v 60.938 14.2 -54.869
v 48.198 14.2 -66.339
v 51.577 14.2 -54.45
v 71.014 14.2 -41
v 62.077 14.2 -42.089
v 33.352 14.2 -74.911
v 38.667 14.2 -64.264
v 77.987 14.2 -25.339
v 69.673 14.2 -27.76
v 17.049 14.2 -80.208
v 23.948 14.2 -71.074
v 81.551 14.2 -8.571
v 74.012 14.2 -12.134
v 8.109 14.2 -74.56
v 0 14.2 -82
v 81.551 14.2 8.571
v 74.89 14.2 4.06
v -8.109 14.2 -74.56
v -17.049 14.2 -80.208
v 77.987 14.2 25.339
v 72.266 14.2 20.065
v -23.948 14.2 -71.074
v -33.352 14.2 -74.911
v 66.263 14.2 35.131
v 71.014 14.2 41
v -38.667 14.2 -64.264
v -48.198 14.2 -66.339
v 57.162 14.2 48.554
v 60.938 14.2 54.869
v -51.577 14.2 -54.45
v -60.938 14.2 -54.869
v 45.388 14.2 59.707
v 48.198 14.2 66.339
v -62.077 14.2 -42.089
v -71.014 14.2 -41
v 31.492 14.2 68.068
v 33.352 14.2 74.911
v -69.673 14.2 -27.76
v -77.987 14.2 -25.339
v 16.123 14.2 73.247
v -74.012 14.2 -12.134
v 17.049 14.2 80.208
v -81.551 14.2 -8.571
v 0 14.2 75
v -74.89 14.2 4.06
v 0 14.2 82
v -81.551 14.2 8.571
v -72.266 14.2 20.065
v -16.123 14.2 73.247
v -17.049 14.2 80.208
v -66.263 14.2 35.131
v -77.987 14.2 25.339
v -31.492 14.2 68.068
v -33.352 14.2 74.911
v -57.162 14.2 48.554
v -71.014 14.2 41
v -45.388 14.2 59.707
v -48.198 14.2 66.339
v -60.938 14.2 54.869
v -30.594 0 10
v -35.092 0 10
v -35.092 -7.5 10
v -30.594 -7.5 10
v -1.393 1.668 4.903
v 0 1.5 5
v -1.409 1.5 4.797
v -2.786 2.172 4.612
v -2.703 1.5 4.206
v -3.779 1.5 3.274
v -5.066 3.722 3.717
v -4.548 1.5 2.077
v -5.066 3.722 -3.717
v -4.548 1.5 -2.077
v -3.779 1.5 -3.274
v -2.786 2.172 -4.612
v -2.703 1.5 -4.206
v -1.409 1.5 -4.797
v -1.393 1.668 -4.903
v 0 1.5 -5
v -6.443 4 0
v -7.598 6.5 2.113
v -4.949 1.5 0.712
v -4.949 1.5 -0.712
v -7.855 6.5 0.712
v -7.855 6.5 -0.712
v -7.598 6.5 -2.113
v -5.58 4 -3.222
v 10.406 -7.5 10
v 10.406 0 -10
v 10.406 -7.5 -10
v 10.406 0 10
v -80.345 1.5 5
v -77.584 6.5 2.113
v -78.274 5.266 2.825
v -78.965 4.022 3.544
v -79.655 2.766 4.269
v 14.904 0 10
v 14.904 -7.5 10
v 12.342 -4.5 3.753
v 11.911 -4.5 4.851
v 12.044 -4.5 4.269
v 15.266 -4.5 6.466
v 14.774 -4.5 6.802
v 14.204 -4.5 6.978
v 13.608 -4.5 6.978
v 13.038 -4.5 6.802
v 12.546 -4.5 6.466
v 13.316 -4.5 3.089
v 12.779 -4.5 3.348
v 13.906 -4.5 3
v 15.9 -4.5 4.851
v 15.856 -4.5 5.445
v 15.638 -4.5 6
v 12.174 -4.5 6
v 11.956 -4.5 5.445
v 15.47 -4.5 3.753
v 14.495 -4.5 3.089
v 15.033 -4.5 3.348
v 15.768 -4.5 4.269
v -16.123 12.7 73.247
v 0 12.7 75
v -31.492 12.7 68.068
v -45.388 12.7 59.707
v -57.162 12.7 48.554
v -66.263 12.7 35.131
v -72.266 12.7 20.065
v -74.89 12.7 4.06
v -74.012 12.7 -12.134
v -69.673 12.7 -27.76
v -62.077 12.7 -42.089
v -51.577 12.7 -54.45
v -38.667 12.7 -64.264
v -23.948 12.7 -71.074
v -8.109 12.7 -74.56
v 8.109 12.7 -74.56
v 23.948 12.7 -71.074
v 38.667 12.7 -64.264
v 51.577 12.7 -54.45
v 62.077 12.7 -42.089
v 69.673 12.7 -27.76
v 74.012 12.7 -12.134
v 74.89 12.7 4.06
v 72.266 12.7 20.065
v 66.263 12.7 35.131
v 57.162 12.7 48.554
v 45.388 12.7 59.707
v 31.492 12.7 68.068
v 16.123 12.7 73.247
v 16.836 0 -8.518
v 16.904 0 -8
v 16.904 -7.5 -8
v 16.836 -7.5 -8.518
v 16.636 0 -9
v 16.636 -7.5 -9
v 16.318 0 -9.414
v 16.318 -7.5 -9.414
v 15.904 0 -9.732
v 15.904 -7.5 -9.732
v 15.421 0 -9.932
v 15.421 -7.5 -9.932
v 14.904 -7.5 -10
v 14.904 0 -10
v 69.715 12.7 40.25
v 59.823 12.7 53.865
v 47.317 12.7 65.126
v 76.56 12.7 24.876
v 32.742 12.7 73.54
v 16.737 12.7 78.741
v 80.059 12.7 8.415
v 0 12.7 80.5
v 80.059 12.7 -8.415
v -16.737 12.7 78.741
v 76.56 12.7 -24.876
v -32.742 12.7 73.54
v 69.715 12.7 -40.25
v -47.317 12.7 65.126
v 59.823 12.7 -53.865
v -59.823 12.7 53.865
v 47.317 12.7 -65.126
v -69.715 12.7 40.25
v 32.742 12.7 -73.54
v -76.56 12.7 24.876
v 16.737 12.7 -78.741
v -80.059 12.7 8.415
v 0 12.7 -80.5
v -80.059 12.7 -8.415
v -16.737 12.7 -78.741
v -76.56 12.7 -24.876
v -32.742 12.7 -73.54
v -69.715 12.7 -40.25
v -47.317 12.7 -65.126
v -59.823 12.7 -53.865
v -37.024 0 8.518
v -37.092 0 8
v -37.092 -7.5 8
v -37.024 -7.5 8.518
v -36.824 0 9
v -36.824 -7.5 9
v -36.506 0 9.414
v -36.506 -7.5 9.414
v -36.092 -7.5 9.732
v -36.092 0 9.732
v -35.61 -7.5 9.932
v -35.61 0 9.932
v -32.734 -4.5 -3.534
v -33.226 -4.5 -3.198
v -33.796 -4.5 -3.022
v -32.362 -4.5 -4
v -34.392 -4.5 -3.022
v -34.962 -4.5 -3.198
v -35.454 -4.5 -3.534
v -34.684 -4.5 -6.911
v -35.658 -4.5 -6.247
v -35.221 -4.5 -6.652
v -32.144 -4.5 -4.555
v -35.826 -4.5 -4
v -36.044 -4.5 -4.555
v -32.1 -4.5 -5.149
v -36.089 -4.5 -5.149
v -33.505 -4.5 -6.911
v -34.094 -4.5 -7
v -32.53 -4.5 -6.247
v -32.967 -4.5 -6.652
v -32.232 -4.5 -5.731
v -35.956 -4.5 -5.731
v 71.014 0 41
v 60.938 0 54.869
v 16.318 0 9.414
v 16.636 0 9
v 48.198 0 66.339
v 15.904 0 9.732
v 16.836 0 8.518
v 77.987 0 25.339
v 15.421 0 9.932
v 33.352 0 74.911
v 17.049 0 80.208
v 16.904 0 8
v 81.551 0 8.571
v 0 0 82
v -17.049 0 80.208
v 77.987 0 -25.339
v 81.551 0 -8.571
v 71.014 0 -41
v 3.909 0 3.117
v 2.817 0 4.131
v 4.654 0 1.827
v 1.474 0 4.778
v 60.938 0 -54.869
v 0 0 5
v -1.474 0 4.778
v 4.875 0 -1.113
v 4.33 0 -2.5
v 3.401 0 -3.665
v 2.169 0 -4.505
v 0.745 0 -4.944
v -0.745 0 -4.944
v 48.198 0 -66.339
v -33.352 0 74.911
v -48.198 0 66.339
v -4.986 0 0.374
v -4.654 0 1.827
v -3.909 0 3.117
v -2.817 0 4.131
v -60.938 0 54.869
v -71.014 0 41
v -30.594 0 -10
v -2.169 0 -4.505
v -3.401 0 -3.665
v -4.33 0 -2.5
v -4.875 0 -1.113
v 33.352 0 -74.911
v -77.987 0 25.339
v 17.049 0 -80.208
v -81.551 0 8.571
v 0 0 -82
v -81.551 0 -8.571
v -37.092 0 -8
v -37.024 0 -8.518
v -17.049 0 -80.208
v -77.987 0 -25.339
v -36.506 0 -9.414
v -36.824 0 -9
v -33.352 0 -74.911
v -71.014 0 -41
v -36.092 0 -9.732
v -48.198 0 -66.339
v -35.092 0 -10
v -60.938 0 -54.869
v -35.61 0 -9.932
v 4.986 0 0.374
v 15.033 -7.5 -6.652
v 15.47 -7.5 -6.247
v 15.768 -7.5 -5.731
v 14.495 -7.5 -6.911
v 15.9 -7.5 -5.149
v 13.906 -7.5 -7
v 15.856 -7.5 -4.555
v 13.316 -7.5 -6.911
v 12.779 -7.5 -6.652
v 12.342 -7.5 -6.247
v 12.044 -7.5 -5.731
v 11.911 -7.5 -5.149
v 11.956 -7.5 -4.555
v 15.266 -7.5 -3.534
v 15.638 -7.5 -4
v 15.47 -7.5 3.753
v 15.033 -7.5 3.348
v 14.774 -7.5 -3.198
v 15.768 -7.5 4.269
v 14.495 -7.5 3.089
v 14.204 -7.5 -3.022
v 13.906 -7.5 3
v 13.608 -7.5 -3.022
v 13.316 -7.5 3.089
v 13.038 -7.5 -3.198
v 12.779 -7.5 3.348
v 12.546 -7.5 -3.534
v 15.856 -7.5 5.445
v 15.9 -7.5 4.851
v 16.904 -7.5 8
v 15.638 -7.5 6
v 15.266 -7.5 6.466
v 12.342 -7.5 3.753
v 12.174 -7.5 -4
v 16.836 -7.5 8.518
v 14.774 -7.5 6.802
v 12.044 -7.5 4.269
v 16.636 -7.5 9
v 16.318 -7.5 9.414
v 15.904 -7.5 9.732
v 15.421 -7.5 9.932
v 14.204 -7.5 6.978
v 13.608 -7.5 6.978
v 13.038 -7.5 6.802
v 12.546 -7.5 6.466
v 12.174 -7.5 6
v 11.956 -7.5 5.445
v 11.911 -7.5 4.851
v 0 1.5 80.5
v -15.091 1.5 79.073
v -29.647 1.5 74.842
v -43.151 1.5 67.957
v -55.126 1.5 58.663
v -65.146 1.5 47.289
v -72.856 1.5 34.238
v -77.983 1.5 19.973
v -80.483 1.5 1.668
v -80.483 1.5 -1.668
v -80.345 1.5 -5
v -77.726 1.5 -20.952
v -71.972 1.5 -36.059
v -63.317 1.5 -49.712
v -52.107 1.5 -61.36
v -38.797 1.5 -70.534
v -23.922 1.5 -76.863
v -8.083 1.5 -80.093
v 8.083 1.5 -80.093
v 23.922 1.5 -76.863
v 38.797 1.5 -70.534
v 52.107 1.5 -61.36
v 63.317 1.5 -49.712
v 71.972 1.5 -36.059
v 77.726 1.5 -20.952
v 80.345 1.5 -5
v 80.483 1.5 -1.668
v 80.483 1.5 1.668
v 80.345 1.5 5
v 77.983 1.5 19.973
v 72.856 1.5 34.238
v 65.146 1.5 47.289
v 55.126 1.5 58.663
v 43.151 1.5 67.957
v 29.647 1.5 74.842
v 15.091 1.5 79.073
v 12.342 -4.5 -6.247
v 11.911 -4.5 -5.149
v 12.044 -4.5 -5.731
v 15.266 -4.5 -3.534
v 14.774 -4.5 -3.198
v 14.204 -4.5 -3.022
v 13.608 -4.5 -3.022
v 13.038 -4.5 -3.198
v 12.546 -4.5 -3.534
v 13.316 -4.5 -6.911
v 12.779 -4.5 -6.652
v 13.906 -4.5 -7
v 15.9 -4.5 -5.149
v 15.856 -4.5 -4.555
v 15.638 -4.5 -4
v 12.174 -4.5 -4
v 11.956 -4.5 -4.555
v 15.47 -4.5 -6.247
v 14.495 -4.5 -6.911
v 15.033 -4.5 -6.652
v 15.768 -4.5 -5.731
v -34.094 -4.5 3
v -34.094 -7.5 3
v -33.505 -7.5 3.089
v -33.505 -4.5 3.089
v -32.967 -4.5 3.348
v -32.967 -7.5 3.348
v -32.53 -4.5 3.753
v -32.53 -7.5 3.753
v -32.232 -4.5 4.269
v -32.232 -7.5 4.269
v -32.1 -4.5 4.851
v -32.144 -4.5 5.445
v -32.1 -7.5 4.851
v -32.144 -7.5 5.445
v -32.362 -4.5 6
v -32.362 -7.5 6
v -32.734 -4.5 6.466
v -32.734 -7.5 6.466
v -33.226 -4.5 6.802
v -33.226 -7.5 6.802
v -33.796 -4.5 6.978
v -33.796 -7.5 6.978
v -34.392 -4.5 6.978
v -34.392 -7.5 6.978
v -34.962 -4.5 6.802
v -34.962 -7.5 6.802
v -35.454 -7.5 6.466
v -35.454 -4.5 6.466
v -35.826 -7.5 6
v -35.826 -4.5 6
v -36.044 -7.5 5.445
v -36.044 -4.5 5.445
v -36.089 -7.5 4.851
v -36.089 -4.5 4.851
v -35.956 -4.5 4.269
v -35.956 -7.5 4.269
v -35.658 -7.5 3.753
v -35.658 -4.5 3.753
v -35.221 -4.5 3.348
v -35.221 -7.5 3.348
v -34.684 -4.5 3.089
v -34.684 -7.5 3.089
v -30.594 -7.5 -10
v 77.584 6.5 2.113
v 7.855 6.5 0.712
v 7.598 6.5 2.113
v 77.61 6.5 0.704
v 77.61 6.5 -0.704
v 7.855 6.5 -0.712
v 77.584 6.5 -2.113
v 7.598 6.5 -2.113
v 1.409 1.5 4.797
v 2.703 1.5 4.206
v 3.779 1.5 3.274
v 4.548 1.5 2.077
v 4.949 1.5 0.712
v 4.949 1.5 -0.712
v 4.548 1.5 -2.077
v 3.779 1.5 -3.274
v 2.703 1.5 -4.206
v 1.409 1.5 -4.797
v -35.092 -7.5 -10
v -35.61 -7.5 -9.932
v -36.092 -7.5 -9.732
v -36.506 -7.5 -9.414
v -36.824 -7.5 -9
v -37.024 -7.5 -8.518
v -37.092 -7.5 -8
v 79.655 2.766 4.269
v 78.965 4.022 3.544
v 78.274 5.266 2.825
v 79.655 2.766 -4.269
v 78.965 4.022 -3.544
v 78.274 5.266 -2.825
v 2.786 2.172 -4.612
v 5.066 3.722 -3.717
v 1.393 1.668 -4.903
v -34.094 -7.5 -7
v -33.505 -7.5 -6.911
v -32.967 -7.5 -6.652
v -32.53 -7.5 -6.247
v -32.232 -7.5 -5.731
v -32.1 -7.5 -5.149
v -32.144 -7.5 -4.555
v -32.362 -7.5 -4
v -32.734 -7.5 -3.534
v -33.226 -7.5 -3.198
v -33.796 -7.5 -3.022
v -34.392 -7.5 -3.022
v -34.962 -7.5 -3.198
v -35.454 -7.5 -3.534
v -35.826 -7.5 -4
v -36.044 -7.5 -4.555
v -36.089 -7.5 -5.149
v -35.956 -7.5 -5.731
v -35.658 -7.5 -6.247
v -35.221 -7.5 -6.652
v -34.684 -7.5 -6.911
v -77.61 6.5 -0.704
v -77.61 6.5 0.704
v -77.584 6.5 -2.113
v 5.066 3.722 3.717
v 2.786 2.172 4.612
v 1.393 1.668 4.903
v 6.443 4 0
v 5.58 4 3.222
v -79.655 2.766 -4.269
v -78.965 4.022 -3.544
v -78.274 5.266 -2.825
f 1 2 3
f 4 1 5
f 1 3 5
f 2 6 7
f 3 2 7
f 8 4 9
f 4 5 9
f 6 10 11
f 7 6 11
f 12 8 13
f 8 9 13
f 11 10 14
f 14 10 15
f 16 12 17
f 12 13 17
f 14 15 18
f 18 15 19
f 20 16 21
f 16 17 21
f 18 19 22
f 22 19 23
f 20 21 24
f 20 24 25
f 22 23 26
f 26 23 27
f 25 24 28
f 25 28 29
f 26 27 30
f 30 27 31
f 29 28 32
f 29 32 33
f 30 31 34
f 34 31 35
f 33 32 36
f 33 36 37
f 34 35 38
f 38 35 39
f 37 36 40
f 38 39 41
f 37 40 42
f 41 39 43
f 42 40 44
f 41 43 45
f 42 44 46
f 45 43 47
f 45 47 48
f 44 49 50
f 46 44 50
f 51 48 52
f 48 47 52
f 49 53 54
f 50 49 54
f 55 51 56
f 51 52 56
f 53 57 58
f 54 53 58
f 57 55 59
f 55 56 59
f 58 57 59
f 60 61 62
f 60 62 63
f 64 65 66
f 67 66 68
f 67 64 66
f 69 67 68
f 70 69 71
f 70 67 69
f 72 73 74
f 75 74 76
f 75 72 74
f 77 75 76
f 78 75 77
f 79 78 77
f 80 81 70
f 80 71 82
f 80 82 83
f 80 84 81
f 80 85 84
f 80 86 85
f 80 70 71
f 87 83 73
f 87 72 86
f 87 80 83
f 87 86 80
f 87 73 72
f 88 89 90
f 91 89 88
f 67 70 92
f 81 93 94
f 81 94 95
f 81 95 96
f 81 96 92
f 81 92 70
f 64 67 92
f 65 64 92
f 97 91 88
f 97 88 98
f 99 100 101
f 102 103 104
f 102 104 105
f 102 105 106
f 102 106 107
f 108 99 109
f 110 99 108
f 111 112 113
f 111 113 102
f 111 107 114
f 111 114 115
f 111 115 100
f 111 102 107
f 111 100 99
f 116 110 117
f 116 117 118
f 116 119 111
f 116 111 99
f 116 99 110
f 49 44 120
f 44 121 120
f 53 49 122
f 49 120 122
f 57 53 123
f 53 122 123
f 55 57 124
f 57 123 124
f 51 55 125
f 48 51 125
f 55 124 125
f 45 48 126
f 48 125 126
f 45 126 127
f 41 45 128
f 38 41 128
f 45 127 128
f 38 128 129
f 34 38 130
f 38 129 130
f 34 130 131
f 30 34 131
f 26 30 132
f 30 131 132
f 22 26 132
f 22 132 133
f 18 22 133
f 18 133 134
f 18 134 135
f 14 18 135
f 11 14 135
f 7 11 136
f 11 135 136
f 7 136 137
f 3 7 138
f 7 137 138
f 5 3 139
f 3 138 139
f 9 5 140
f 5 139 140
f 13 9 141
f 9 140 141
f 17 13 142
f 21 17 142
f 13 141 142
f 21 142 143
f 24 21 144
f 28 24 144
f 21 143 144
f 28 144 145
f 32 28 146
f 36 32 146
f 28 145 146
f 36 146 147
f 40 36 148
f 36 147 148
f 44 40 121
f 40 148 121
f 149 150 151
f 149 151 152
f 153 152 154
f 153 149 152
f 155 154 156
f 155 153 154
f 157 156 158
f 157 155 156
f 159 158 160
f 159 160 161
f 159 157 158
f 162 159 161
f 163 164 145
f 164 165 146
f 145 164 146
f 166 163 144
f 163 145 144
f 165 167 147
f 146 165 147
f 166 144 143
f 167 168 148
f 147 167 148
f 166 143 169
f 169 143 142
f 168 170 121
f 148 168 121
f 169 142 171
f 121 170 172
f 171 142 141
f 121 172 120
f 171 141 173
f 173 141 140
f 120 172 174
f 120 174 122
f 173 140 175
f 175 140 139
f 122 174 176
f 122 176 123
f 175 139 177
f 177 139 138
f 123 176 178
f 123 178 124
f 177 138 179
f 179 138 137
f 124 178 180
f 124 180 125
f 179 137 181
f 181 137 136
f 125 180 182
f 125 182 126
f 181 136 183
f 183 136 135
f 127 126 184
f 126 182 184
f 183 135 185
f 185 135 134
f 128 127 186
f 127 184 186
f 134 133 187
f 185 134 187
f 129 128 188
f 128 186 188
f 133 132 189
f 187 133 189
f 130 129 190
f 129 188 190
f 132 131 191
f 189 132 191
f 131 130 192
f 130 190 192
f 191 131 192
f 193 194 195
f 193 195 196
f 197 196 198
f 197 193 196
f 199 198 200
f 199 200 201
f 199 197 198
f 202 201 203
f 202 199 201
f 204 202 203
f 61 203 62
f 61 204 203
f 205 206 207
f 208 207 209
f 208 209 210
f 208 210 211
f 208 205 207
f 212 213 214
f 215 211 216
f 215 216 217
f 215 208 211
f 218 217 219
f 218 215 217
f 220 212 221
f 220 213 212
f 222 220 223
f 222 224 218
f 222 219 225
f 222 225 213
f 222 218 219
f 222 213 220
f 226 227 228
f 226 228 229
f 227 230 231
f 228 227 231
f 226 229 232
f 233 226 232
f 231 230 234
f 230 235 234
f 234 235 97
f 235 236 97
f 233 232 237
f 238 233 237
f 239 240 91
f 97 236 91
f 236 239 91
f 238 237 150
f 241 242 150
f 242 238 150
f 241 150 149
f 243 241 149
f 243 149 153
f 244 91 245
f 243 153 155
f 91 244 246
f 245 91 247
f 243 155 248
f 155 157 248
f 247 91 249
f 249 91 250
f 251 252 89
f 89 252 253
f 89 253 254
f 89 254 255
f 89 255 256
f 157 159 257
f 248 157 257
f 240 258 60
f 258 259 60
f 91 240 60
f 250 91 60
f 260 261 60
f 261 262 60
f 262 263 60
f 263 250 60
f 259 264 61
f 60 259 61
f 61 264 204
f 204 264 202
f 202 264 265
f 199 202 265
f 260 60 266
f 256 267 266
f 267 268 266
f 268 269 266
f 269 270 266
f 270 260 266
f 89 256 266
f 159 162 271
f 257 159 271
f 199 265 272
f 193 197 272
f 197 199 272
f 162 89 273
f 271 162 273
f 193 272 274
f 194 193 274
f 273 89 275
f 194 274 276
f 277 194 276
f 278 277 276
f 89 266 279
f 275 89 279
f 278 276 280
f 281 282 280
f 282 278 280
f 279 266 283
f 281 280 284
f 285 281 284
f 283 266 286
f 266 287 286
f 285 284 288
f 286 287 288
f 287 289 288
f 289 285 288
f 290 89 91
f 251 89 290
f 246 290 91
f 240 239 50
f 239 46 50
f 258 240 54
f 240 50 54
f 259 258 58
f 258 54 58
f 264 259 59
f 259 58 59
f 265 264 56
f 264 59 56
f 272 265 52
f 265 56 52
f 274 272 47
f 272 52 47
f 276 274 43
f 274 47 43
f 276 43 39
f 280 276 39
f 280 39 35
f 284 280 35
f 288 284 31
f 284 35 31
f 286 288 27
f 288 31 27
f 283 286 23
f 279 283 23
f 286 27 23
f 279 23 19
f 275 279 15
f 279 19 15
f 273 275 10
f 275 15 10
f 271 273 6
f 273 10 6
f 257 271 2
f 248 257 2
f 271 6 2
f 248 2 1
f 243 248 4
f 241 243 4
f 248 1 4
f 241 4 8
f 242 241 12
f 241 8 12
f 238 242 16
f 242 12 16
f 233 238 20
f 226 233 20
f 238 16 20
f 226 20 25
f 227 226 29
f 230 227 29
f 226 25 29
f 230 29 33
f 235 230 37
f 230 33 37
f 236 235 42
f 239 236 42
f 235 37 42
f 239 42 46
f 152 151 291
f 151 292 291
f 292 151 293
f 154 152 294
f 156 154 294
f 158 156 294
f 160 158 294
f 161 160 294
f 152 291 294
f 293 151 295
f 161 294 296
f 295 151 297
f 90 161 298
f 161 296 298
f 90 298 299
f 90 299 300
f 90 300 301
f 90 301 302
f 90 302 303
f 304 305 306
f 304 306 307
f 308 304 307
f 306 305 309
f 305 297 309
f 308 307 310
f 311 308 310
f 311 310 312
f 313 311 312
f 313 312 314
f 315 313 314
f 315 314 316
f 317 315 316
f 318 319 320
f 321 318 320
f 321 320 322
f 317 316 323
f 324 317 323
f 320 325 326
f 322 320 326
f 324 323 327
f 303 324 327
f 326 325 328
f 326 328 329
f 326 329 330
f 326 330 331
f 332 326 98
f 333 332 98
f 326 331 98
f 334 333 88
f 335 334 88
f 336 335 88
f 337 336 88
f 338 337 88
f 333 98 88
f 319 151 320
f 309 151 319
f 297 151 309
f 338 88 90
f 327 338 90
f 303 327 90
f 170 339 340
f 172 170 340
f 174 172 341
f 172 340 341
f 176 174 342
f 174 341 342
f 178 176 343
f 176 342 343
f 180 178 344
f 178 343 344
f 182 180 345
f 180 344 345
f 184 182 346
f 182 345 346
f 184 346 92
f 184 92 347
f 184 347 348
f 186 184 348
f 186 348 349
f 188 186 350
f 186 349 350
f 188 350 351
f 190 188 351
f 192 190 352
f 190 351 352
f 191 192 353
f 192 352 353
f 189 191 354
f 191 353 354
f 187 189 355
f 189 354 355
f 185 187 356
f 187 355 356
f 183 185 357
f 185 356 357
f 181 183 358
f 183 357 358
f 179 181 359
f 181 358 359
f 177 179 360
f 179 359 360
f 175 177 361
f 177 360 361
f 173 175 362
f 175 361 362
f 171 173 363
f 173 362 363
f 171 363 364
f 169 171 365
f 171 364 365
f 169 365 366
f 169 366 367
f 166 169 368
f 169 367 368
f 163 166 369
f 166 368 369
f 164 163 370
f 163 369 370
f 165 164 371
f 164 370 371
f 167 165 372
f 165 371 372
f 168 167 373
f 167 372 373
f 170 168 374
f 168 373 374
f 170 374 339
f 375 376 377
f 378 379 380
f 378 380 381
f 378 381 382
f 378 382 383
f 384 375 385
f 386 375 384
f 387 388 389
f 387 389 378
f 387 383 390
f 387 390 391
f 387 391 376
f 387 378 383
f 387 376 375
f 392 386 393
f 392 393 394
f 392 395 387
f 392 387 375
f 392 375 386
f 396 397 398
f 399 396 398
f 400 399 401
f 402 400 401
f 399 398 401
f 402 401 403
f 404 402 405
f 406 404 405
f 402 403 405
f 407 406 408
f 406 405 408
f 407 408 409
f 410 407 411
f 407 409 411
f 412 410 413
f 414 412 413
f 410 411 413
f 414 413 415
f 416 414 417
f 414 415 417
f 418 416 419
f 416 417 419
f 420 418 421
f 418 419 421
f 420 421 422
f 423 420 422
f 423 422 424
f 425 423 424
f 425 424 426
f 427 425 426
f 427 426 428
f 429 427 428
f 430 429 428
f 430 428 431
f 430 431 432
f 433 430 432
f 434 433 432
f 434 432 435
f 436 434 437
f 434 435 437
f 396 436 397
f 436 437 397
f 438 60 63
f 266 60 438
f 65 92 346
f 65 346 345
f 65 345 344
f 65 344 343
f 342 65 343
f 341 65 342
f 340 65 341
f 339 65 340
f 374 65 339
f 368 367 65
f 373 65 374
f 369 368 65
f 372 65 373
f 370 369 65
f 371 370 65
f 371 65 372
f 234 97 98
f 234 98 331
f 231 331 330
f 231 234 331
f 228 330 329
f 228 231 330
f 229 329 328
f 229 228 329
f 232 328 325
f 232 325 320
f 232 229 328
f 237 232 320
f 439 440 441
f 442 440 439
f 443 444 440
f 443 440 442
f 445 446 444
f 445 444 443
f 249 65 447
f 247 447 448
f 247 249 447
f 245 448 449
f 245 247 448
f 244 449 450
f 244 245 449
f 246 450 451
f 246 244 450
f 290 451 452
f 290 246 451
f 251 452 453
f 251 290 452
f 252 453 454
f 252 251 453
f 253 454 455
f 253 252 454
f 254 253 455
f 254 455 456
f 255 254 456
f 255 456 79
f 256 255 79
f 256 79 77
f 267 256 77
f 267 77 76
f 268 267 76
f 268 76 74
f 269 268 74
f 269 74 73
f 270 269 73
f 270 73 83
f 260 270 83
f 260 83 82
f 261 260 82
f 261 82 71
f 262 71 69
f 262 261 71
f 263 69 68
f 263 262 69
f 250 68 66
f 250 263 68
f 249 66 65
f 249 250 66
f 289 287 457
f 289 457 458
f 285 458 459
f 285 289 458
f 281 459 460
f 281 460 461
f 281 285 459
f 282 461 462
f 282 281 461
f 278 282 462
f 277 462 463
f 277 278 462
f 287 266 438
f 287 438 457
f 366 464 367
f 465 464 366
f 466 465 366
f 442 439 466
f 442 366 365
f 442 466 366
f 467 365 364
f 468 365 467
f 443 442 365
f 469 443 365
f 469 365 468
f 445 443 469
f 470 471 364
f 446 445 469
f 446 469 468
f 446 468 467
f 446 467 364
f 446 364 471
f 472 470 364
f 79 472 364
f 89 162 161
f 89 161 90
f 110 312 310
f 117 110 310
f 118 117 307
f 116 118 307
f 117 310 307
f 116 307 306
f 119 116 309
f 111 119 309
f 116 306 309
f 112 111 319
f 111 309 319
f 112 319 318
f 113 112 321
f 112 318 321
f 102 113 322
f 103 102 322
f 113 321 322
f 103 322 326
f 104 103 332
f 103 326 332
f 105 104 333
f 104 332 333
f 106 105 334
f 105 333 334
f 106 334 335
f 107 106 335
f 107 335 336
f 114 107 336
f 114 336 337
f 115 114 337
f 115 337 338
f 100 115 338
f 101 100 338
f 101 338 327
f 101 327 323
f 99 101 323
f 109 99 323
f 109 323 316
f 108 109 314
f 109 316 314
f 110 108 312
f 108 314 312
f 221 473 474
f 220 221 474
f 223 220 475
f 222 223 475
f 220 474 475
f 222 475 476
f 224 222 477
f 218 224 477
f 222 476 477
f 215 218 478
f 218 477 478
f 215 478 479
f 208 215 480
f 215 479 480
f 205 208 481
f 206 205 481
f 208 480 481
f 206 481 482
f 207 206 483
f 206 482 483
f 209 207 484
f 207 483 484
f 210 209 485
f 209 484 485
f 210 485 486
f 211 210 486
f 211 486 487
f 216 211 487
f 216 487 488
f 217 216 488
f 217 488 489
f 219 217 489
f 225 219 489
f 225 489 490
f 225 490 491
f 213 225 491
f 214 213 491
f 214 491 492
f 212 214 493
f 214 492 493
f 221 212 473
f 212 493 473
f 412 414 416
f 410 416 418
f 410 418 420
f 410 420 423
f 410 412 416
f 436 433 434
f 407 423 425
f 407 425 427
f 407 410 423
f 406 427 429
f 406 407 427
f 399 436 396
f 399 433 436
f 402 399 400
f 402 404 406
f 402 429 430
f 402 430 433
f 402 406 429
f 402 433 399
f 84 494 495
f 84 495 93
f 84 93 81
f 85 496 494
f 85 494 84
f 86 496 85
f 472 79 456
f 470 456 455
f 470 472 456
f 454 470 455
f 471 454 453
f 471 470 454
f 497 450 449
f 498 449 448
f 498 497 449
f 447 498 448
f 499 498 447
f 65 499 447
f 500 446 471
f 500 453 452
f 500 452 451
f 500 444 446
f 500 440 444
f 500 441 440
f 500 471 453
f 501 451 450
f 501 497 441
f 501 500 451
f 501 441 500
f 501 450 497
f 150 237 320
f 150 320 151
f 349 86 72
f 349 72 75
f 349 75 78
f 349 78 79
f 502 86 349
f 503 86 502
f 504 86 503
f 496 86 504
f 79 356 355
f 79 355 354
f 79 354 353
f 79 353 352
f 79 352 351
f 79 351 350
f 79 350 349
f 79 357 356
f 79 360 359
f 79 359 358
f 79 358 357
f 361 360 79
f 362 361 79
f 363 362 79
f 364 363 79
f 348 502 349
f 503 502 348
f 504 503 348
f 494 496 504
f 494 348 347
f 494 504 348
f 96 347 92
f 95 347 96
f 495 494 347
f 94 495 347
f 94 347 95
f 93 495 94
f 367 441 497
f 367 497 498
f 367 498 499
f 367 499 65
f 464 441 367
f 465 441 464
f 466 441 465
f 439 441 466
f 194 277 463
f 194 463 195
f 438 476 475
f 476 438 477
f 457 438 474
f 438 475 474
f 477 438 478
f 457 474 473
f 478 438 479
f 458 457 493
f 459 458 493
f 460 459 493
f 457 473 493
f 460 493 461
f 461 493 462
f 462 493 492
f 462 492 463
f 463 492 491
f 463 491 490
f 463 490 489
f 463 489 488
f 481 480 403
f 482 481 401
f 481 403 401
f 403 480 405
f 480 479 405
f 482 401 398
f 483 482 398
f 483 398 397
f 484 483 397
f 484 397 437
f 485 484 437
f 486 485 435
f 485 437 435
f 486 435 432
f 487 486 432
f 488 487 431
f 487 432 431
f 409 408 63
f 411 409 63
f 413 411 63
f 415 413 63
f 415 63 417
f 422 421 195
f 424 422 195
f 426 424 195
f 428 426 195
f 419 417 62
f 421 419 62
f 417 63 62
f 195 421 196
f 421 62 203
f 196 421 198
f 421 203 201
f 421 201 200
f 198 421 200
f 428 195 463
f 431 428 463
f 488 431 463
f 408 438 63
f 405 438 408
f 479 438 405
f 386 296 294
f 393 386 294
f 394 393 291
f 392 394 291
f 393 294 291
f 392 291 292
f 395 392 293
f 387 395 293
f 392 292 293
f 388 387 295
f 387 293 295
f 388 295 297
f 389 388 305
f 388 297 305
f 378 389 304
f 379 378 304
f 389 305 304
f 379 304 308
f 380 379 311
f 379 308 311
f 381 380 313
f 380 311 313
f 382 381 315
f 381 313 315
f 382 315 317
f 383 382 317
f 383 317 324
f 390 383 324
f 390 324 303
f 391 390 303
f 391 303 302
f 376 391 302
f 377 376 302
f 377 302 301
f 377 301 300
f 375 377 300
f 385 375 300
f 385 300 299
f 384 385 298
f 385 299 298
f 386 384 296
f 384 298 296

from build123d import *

# Parameters (mm, degrees)
SKETCH2_R             = 80.5
SKETCH2_R_2           = 5
BOSS_EXTRUDE1_DEPTH   = 1.5
BOSS_EXTRUDE3_DEPTH   = 5
BOSS_EXTRUDE3_DRAFT   = 30
BOSS_EXTRUDE3_2_DEPTH = 5
BOSS_EXTRUDE3_2_DRAFT = 30
BOSS_EXTRUDE4_DEPTH   = 7.5
SKETCH8_R             = 2
CUT_EXTRUDE1_DEPTH    = 3


# Read off the part's stored shape, not the designer's step: Boss-Extrude3
with BuildPart() as part:
    # Sketch2 → Boss-Extrude1 (new body)
    with BuildSketch(Plane(origin=(0, 0, 0), x_dir=(1, 0, 0), z_dir=(0, 1, 0))):
        with Locations(Location((0, 0, 0), (0, 0, 270))):
            Circle(SKETCH2_R)
        with Locations(Location((0, 0, 0), (0, 0, 270))):
            Circle(SKETCH2_R_2, mode=Mode.SUBTRACT)
    extrude(amount=BOSS_EXTRUDE1_DEPTH)


with BuildPart() as boss_extrude3_tool:
    # Boss-Extrude3 outline → Boss-Extrude3 (with draft: the straight prism first)
    with BuildSketch(Plane(origin=(0, 6.5, 0), x_dir=(1, 0, 0), z_dir=(0, 1, 0))):
        with BuildLine():
            Line((-7.598356857, 2.113248654), (-77.584473619, 2.113248654))
            ThreePointArc((-77.584473619, 2.113248654), (-77.613248654, 0), (-77.584473619, -2.113248654))
            Line((-77.584473619, -2.113248654), (-7.598356857, -2.113248654))
            ThreePointArc((-7.598356857, -2.113248654), (-7.886751346, 0), (-7.598356857, 2.113248654))
        make_face()
    extrude(amount=-BOSS_EXTRUDE3_DEPTH)
    # Boss-Extrude3: the draft: its side faces are tilted about the plane it starts from
    boss_extrude3_sides = [boss_extrude3_tool.faces().sort_by_distance(p)[0] for p in [
        (-42.591415238, 4, -2.113248654),
        (-77.613248654, 4, 0),
        (-42.591415238, 4, 2.113248654),
        (-7.886751346, 4, 0),
    ]]
    draft(boss_extrude3_sides, Plane(origin=(0, 6.5, 0), x_dir=(1, 0, 0), z_dir=(0, 1, 0)), BOSS_EXTRUDE3_DRAFT)


with BuildPart() as part_1:
    add(part.part)

    # Boss-Extrude3: add boss_extrude3_tool
    add(boss_extrude3_tool.part)


with BuildPart() as boss_extrude3_2_tool:
    # Boss-Extrude3 2 outline → Boss-Extrude3 2 (with draft: the straight prism first)
    with BuildSketch(Plane(origin=(0, 6.5, 0), x_dir=(1, 0, 0), z_dir=(0, 1, 0))):
        with BuildLine():
            Line((77.584473619, 2.113248654), (7.598356857, 2.113248654))
            ThreePointArc((7.598356857, 2.113248654), (7.886751346, 0), (7.598356857, -2.113248654))
            Line((7.598356857, -2.113248654), (77.584473619, -2.113248654))
            ThreePointArc((77.584473619, -2.113248654), (77.613248654, 0), (77.584473619, 2.113248654))
        make_face()
    extrude(amount=-BOSS_EXTRUDE3_2_DEPTH)
    # Boss-Extrude3 2: the draft: its side faces are tilted about the plane it starts from
    boss_extrude3_2_sides = [boss_extrude3_2_tool.faces().sort_by_distance(p)[0] for p in [
        (42.591415238, 4, 2.113248654),
        (77.613248654, 4, 0),
        (42.591415238, 4, -2.113248654),
        (7.886751346, 4, 0),
    ]]
    draft(boss_extrude3_2_sides, Plane(origin=(0, 6.5, 0), x_dir=(1, 0, 0), z_dir=(0, 1, 0)), BOSS_EXTRUDE3_2_DRAFT)


with BuildPart() as part_2:
    add(part_1.part)

    # Boss-Extrude3 2: add boss_extrude3_2_tool
    add(boss_extrude3_2_tool.part)

    # Sketch6 → Revolve1 (revolve)
    with BuildSketch(Plane.XY, mode=Mode.PRIVATE) as revolve1_sk:
        Polygon((-80.5, 0), (-82, 0), (-82, 14.2), (-75, 14.2), (-75, 12.7), (-80.5, 12.7), align=None)
    revolve(revolve1_sk.sketch.rotate(Axis((0, 13, 0), (0, -1, 0)), 270), axis=Axis((0, 13, 0), (0, -1, 0)))

    # Sketch7 → Boss-Extrude4 (add)
    with BuildSketch(Plane.XZ):
        with BuildLine():
            Line((10.405859981, 10), (14.903696288, 10))
            ThreePointArc((14.903696288, 10), (16.317909851, 9.414213562), (16.903696288, 8))
            Line((16.903696288, 8), (16.903696288, -8))
            ThreePointArc((16.903696288, -8), (16.317909851, -9.414213562), (14.903696288, -10))
            Line((14.903696288, -10), (10.405859981, -10))
            Line((10.405859981, -10), (10.405859981, 10))
        make_face()
        with BuildLine():
            Line((-30.594140019, -10), (-35.091976326, -10))
            ThreePointArc((-35.091976326, -10), (-36.506189888, -9.414213562), (-37.091976326, -8))
            Line((-37.091976326, -8), (-37.091976326, 8))
            ThreePointArc((-37.091976326, 8), (-36.506189888, 9.414213562), (-35.091976326, 10))
            Line((-35.091976326, 10), (-30.594140019, 10))
            Line((-30.594140019, 10), (-30.594140019, -10))
        make_face()
    extrude(amount=BOSS_EXTRUDE4_DEPTH)

    # Sketch8 → Cut-Extrude1 (cut)
    with BuildSketch(Plane.XZ.offset(7.5)):
        with Locations(Location((13.905859981, -5, 0), (0, 0, 270))):
            Circle(SKETCH8_R)
        with Locations(Location((13.905859981, 5, 0), (0, 0, 270))):
            Circle(SKETCH8_R)
        with Locations(Location((-34.094140019, -5, 0), (0, 0, 270))):
            Circle(SKETCH8_R)
        with Locations(Location((-34.094140019, 5, 0), (0, 0, 270))):
            Circle(SKETCH8_R)
    extrude(amount=-CUT_EXTRUDE1_DEPTH, mode=Mode.SUBTRACT)


solid = part_2.part
